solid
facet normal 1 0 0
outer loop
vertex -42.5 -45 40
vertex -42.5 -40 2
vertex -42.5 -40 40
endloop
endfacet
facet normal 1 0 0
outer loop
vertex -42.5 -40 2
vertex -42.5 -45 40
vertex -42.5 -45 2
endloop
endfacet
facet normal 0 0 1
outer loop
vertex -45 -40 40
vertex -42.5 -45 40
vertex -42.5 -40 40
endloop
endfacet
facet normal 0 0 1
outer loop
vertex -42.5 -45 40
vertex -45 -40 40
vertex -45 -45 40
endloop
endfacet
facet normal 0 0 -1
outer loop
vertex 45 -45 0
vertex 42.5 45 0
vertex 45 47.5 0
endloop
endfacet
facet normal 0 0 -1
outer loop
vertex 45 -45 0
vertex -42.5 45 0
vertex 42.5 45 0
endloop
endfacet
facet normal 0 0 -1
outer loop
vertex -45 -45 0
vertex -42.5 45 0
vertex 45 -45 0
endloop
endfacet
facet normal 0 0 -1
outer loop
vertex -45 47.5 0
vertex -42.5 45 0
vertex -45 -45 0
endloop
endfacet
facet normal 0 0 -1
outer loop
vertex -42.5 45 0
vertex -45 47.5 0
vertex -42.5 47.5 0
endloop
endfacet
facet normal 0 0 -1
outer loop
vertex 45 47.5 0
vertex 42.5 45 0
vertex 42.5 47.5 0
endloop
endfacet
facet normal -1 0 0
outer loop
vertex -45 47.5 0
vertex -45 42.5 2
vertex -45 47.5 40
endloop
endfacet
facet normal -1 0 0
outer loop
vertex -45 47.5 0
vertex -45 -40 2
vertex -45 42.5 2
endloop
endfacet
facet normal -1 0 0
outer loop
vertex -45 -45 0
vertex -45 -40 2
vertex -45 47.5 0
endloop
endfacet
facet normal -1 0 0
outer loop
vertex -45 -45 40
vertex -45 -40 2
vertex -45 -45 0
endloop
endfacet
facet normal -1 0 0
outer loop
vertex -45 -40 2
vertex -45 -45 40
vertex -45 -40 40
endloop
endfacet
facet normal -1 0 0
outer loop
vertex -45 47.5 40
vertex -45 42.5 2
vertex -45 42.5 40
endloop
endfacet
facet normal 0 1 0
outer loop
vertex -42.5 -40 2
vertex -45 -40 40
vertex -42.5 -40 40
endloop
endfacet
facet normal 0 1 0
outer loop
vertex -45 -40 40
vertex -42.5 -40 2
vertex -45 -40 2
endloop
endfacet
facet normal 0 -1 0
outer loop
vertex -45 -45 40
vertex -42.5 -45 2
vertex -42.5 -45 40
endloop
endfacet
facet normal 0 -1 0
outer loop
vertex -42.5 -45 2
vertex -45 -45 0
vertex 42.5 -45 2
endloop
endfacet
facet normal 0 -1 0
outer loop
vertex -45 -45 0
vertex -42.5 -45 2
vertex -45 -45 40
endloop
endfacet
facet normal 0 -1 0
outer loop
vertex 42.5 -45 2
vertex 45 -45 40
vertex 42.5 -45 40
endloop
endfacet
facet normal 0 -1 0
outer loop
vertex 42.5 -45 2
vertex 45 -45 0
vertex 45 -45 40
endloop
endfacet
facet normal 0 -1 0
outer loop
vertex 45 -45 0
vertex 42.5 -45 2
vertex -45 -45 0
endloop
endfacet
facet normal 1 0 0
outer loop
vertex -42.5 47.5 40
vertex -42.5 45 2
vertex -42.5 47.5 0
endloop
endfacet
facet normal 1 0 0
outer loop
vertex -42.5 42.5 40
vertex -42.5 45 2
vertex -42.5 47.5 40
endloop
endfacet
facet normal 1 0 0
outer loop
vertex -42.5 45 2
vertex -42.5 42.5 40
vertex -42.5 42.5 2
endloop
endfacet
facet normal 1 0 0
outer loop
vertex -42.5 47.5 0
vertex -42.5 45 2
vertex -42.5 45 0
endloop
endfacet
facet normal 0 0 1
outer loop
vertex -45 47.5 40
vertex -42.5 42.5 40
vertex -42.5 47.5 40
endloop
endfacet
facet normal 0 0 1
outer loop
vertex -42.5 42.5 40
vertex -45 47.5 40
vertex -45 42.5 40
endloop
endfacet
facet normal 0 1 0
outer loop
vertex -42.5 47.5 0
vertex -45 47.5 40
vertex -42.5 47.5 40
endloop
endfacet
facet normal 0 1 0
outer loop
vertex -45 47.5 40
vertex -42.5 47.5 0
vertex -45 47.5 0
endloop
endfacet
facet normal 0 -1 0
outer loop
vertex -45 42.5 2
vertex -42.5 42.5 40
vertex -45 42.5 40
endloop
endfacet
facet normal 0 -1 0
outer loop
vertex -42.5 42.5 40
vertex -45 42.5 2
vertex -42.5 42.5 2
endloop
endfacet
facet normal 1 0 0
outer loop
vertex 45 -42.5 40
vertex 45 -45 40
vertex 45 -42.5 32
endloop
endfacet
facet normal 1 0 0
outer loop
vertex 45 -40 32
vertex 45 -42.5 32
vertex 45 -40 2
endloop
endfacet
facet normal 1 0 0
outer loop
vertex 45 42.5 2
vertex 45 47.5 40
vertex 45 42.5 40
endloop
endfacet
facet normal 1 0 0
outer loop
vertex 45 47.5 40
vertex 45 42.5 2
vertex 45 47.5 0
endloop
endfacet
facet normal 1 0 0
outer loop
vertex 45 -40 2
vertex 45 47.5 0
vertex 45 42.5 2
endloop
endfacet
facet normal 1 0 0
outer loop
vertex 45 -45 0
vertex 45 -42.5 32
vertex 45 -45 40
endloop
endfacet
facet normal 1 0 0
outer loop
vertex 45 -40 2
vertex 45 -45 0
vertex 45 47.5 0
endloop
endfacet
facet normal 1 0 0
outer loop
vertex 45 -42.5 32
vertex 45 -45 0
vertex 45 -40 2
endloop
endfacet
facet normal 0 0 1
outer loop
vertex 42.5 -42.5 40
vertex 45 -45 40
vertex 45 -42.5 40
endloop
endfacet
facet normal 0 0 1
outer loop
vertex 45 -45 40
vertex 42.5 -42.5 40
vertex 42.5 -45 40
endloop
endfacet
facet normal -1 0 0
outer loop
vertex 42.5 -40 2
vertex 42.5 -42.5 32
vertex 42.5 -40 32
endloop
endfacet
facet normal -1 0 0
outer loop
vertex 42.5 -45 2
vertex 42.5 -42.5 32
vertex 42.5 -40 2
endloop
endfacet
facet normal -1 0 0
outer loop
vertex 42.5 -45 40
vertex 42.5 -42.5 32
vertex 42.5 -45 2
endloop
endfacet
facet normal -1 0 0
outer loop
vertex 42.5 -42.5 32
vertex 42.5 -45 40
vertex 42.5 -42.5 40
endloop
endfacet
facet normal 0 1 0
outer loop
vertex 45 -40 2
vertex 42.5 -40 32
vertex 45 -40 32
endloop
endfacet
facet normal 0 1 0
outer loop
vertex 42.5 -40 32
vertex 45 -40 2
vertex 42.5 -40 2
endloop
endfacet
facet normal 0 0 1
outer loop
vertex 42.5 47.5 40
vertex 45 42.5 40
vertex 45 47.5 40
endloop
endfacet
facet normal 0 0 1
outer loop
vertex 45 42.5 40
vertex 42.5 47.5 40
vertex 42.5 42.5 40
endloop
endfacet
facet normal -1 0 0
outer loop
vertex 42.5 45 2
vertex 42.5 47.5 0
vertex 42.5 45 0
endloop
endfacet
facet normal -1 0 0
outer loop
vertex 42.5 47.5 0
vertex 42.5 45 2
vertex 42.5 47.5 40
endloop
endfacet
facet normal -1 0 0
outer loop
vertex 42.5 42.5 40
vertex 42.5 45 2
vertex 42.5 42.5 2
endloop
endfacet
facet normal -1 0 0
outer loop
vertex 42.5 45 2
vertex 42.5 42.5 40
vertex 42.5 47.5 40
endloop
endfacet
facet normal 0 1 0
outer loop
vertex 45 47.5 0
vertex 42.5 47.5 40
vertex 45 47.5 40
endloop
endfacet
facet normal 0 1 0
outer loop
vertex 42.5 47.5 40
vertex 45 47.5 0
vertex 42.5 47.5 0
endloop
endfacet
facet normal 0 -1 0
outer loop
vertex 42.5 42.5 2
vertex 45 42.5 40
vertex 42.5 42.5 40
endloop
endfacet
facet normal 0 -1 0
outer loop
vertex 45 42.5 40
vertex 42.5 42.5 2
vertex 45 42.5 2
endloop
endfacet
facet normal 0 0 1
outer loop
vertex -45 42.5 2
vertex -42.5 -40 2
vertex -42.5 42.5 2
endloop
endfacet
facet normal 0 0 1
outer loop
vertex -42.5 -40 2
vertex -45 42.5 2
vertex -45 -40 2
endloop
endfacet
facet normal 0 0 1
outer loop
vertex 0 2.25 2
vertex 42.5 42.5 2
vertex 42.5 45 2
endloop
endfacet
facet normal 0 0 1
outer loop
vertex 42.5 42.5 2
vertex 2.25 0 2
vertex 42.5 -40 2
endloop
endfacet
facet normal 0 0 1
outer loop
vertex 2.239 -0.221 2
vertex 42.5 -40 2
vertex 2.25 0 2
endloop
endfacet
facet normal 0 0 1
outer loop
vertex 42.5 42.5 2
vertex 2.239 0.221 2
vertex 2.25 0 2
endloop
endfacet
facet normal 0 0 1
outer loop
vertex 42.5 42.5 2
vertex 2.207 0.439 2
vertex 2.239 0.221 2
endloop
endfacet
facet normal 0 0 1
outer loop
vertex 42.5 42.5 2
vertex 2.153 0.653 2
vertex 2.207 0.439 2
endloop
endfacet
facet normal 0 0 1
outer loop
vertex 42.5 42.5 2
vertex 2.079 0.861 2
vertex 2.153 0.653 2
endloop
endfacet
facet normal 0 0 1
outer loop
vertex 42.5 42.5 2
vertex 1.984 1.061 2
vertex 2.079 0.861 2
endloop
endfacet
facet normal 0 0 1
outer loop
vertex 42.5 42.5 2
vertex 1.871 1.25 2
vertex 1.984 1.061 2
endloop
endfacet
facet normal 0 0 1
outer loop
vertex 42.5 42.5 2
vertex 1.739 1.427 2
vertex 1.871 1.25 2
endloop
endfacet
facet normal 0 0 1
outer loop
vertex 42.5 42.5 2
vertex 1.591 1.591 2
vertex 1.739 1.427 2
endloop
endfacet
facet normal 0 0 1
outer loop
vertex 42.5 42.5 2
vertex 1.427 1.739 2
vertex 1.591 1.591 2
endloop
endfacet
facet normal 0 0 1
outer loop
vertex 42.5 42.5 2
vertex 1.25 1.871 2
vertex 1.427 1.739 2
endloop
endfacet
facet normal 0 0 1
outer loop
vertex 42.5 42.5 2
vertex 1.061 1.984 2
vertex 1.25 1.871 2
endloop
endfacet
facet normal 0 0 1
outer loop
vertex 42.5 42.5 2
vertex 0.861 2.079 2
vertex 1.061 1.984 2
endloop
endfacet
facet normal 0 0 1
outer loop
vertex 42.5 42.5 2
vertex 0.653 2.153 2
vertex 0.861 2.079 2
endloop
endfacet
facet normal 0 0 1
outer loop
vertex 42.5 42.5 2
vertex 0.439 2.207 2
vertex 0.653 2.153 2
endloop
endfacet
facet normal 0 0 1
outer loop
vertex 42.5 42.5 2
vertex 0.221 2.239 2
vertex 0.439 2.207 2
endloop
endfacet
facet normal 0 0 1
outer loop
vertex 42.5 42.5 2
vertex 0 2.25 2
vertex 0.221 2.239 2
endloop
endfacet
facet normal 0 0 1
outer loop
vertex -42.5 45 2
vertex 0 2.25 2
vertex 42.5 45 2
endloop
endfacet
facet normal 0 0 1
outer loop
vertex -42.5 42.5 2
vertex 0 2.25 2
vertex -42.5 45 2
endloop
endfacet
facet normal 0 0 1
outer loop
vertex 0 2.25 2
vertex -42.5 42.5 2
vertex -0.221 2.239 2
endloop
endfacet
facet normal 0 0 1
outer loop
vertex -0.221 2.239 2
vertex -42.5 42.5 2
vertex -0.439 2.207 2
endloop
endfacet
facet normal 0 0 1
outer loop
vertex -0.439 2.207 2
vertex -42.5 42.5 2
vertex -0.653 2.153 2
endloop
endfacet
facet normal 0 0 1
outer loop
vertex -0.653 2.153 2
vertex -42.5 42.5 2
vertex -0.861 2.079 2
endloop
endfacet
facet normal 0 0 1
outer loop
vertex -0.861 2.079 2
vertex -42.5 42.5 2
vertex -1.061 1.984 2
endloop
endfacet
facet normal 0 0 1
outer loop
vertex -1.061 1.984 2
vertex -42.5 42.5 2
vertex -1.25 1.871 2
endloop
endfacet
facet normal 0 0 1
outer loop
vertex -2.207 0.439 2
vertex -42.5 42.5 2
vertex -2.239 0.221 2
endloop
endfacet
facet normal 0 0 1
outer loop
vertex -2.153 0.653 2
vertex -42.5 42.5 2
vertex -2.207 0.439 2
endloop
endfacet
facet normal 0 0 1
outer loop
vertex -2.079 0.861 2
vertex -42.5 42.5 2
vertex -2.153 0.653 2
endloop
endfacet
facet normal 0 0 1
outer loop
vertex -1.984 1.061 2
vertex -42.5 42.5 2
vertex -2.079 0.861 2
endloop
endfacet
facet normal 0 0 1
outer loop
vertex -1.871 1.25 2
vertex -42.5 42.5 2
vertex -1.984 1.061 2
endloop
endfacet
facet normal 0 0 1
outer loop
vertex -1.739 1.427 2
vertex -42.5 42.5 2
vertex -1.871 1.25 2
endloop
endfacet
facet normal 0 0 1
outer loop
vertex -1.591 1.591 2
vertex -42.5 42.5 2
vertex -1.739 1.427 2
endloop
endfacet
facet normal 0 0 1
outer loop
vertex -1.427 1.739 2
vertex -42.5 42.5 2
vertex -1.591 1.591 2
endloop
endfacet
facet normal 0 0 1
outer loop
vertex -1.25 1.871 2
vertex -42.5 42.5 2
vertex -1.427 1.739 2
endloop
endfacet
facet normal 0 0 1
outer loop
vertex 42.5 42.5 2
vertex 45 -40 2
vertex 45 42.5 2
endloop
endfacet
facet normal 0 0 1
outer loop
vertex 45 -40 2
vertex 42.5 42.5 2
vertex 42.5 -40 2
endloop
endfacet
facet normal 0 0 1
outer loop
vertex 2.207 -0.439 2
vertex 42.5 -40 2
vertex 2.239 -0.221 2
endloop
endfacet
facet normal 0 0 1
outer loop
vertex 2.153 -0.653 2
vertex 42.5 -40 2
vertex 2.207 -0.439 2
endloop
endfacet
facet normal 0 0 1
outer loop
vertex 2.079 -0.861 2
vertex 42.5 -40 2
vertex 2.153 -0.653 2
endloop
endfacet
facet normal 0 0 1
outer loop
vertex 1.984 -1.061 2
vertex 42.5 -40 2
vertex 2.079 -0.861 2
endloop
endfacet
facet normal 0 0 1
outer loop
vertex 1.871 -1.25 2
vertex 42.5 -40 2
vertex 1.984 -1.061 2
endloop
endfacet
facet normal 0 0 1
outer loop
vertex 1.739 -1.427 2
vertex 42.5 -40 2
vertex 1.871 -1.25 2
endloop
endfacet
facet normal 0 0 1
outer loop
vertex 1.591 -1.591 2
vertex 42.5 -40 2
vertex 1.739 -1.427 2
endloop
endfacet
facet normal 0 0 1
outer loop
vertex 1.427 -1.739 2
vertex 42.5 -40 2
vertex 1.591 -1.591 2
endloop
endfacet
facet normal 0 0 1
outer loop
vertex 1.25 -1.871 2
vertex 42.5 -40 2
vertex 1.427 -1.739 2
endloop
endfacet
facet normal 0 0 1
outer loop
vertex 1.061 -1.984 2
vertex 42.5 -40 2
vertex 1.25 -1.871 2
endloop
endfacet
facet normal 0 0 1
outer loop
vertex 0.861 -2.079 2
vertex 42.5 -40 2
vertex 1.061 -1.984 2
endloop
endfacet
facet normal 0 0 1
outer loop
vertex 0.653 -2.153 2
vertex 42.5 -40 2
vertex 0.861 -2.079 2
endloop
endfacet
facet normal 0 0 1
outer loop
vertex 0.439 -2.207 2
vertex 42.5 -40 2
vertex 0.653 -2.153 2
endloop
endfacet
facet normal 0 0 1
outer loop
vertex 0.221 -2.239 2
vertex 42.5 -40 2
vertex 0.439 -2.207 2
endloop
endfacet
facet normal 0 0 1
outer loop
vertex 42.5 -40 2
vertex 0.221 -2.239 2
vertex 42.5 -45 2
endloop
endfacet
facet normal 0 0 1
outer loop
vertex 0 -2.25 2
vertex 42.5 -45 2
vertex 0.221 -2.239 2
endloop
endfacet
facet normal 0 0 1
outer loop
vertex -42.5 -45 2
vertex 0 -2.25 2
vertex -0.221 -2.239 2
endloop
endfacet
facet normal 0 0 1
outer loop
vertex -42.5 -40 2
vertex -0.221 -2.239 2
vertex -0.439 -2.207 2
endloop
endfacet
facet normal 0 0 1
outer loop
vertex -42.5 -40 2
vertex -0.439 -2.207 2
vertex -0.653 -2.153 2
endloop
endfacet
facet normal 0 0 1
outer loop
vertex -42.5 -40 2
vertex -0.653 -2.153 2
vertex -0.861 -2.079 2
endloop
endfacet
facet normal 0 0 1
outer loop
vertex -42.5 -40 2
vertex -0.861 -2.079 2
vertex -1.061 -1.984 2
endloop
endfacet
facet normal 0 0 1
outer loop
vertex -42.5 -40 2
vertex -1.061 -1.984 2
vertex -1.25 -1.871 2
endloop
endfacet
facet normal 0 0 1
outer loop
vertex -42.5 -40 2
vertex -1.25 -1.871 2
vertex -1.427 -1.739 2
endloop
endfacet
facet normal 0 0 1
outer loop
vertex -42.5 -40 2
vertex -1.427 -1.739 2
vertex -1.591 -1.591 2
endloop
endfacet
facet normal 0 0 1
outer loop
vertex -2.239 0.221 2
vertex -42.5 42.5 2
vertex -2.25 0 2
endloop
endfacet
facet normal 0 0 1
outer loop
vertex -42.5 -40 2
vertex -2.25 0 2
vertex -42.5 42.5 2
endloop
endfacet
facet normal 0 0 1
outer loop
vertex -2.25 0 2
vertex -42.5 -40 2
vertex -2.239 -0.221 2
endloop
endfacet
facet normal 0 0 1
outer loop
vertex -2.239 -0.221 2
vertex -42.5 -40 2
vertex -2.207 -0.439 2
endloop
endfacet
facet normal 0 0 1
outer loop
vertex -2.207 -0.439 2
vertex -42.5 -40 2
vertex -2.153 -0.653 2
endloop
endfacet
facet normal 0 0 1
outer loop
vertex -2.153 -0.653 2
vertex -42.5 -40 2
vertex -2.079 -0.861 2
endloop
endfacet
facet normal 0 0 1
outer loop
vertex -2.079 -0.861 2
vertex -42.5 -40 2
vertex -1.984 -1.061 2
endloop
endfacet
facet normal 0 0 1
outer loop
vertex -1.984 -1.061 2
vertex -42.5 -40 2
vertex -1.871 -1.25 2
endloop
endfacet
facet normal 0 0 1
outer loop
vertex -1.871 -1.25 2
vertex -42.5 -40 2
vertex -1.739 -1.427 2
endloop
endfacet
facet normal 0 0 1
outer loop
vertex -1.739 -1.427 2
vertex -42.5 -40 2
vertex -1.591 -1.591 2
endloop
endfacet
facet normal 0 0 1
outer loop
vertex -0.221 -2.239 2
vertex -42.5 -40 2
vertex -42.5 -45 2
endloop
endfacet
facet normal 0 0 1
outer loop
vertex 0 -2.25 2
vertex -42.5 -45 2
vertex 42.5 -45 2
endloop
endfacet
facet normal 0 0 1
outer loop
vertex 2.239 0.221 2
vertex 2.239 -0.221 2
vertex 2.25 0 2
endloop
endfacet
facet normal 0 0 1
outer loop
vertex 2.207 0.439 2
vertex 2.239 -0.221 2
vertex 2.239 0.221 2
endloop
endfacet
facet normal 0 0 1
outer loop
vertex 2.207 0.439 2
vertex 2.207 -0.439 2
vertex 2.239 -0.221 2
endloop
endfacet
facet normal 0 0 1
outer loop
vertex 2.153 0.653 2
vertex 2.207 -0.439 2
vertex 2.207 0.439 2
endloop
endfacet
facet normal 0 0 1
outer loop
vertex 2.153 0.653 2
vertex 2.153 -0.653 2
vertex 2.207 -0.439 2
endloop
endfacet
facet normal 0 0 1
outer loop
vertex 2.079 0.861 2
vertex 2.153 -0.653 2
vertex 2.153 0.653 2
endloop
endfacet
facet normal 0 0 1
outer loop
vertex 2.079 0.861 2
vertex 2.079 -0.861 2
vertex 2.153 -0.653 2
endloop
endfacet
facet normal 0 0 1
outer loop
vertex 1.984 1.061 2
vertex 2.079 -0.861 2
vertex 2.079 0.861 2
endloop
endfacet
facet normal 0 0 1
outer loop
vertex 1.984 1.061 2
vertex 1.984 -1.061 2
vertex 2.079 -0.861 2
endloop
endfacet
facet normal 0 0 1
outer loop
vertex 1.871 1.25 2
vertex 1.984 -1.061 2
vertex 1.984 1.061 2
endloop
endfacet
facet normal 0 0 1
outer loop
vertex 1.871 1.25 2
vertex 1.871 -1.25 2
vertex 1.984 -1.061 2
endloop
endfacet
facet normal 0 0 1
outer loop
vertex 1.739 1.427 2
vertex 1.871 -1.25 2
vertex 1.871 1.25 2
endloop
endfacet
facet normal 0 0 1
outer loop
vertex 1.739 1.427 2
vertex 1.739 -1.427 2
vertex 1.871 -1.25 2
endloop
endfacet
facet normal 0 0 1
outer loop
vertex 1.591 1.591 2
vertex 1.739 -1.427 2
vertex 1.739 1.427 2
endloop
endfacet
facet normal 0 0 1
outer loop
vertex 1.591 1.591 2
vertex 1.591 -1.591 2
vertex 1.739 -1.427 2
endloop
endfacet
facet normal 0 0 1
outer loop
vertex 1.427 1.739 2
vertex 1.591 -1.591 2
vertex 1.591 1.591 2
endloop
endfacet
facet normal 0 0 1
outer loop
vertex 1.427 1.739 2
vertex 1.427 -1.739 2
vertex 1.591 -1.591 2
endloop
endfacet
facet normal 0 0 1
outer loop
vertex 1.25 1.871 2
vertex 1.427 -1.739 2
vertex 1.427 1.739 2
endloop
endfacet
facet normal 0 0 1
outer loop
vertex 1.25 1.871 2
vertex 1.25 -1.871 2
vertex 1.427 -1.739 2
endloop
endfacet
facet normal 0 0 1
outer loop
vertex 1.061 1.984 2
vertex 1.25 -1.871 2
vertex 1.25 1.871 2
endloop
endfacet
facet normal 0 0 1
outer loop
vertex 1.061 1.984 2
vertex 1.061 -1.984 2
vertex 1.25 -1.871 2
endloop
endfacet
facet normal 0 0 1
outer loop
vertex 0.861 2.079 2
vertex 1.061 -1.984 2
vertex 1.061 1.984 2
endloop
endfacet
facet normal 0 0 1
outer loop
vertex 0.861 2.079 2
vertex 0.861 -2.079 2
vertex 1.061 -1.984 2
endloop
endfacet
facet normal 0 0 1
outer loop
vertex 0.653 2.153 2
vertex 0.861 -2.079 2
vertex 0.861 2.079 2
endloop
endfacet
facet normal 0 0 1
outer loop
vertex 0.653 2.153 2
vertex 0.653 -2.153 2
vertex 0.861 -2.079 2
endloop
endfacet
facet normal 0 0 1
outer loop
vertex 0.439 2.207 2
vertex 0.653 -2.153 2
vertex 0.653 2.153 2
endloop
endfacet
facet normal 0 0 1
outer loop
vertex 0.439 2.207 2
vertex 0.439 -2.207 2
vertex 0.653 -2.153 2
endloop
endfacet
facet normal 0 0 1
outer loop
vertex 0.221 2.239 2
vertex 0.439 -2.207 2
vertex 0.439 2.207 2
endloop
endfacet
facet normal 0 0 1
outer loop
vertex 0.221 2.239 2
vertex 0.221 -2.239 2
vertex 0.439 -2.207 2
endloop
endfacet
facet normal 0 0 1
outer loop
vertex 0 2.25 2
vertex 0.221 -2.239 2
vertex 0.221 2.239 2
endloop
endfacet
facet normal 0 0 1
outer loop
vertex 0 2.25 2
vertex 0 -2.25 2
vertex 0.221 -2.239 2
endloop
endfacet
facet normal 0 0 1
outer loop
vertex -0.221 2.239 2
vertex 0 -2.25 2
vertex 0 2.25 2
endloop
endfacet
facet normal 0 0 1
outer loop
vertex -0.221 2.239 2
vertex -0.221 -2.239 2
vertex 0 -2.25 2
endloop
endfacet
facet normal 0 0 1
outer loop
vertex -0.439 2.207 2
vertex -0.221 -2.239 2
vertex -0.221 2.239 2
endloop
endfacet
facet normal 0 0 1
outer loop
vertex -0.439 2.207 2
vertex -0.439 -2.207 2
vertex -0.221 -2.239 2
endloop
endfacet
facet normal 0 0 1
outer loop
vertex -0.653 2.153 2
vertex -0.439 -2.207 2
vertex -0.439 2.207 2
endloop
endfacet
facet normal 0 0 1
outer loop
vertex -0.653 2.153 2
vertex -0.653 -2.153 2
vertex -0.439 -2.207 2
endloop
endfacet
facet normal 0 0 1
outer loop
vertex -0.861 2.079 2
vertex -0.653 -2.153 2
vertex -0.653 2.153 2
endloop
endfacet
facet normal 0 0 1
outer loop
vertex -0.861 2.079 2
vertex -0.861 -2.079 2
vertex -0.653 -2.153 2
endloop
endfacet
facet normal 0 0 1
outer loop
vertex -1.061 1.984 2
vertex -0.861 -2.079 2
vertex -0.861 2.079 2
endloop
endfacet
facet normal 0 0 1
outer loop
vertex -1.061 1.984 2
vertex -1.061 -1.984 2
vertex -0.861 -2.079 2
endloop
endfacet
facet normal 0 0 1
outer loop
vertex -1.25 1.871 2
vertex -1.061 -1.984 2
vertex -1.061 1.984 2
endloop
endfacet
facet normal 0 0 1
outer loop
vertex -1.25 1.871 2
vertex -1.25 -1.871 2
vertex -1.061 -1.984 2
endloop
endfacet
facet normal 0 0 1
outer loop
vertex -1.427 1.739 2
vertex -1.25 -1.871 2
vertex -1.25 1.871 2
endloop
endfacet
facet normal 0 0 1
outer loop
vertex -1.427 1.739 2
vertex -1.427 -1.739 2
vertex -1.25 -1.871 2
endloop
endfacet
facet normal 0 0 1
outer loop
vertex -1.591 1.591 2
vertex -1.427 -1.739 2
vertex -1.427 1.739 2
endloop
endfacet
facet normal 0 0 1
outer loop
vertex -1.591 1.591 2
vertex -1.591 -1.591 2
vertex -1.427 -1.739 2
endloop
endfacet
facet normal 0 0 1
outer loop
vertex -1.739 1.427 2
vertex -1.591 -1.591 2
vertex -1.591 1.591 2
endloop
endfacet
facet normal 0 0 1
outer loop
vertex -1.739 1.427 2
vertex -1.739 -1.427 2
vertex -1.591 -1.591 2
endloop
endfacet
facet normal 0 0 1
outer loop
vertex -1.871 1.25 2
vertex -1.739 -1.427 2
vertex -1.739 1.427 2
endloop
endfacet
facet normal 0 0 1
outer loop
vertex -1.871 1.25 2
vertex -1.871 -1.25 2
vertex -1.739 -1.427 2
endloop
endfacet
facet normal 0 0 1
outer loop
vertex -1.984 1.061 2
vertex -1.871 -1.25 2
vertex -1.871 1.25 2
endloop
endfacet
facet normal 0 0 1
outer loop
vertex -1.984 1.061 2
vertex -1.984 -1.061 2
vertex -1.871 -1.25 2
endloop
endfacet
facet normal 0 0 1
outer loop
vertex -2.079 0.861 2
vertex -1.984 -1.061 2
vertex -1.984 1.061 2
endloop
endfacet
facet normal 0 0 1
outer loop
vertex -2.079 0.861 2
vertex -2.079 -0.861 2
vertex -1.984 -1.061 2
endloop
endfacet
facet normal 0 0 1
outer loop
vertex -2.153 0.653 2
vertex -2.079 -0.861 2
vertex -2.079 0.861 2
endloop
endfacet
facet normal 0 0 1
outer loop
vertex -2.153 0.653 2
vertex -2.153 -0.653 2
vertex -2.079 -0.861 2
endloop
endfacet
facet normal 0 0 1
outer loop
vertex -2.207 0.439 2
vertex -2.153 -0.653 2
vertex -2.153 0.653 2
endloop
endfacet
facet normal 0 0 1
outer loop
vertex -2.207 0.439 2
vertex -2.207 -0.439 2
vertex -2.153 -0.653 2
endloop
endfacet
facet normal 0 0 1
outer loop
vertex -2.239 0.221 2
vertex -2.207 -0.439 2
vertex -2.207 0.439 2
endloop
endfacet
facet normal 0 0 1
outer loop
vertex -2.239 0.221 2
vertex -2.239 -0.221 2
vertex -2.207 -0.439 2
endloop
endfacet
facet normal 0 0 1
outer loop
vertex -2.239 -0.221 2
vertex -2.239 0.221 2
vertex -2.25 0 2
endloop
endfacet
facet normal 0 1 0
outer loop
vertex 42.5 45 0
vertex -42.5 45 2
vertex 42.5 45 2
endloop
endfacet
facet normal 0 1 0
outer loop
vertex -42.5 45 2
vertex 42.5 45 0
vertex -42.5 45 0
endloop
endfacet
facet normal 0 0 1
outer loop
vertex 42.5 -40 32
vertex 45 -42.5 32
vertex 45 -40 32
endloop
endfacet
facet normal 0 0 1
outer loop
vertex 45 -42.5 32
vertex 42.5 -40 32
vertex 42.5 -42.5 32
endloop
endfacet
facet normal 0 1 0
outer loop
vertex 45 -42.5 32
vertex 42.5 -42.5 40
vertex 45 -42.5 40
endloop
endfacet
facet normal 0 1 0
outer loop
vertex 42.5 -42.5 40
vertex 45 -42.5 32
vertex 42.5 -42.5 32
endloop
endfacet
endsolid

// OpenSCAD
// Magnetic stirrer housing - upside-down open box over a 80 mm PC fan
// Print orientation: top plate on the bed (z = 0), walls rise to z = 40

// ---------- Dimensions ----------
outer_x      = 90;    // outer size in X (mm)
outer_y      = 90;    // outer size in Y (mm)
top_t        = 2;     // top plate thickness (mm)
wall_t       = 2.5;   // wall thickness (mm)
wall_h       = 40;    // wall height from top plate (mm)
hole_d       = 4.5;   // M4 screw hole diameter (mm)
hole_pitch   = 71.5;  // square pattern pitch for holes (mm)
notch_w      = 12;    // cable notch width (mm)
notch_bottom = 8;     // notch depth from open edge (mm)

eps          = 0.5;   // cutter overshoot past faces (mm)
$fn          = 64;    // curve resolution

// ---------- Derived ----------
total_h = top_t + wall_h;   // overall height (mm)

// ---------- Model ----------
difference() {
    // Solid body
    union() {
        // Top plate
        translate([-outer_x/2, -outer_y/2, 0])
            cube([outer_x, outer_y, top_t]);
        // Walls
        for (sx = [-1, 1], sy = [-1, 1])
            translate([sx > 0 ? outer_x/2 - wall_t : -outer_x/2,
                       sy > 0 ? outer_y/2 - wall_t : -outer_y/2,
                       0])
                cube([wall_t, outer_x - outer_y + 2*wall_t, wall_h]);
    }

    // Screw holes through top plate
    for (i = [0, 1, 2, 3])
        translate([0, 0, top_t])
            rotate([0, 0, i * 90])
                cylinder(d = hole_d, h = wall_h + eps, $fn = 64);

    // Cable notch in one wall (from open edge down to z = wall_h - notch_bottom)
    translate([outer_x/2 - notch_w/2, -outer_y/2 + wall_t, wall_h - notch_bottom])
        cube([notch_w, outer_y - outer_y + notch_w, notch_bottom + eps]);
}
